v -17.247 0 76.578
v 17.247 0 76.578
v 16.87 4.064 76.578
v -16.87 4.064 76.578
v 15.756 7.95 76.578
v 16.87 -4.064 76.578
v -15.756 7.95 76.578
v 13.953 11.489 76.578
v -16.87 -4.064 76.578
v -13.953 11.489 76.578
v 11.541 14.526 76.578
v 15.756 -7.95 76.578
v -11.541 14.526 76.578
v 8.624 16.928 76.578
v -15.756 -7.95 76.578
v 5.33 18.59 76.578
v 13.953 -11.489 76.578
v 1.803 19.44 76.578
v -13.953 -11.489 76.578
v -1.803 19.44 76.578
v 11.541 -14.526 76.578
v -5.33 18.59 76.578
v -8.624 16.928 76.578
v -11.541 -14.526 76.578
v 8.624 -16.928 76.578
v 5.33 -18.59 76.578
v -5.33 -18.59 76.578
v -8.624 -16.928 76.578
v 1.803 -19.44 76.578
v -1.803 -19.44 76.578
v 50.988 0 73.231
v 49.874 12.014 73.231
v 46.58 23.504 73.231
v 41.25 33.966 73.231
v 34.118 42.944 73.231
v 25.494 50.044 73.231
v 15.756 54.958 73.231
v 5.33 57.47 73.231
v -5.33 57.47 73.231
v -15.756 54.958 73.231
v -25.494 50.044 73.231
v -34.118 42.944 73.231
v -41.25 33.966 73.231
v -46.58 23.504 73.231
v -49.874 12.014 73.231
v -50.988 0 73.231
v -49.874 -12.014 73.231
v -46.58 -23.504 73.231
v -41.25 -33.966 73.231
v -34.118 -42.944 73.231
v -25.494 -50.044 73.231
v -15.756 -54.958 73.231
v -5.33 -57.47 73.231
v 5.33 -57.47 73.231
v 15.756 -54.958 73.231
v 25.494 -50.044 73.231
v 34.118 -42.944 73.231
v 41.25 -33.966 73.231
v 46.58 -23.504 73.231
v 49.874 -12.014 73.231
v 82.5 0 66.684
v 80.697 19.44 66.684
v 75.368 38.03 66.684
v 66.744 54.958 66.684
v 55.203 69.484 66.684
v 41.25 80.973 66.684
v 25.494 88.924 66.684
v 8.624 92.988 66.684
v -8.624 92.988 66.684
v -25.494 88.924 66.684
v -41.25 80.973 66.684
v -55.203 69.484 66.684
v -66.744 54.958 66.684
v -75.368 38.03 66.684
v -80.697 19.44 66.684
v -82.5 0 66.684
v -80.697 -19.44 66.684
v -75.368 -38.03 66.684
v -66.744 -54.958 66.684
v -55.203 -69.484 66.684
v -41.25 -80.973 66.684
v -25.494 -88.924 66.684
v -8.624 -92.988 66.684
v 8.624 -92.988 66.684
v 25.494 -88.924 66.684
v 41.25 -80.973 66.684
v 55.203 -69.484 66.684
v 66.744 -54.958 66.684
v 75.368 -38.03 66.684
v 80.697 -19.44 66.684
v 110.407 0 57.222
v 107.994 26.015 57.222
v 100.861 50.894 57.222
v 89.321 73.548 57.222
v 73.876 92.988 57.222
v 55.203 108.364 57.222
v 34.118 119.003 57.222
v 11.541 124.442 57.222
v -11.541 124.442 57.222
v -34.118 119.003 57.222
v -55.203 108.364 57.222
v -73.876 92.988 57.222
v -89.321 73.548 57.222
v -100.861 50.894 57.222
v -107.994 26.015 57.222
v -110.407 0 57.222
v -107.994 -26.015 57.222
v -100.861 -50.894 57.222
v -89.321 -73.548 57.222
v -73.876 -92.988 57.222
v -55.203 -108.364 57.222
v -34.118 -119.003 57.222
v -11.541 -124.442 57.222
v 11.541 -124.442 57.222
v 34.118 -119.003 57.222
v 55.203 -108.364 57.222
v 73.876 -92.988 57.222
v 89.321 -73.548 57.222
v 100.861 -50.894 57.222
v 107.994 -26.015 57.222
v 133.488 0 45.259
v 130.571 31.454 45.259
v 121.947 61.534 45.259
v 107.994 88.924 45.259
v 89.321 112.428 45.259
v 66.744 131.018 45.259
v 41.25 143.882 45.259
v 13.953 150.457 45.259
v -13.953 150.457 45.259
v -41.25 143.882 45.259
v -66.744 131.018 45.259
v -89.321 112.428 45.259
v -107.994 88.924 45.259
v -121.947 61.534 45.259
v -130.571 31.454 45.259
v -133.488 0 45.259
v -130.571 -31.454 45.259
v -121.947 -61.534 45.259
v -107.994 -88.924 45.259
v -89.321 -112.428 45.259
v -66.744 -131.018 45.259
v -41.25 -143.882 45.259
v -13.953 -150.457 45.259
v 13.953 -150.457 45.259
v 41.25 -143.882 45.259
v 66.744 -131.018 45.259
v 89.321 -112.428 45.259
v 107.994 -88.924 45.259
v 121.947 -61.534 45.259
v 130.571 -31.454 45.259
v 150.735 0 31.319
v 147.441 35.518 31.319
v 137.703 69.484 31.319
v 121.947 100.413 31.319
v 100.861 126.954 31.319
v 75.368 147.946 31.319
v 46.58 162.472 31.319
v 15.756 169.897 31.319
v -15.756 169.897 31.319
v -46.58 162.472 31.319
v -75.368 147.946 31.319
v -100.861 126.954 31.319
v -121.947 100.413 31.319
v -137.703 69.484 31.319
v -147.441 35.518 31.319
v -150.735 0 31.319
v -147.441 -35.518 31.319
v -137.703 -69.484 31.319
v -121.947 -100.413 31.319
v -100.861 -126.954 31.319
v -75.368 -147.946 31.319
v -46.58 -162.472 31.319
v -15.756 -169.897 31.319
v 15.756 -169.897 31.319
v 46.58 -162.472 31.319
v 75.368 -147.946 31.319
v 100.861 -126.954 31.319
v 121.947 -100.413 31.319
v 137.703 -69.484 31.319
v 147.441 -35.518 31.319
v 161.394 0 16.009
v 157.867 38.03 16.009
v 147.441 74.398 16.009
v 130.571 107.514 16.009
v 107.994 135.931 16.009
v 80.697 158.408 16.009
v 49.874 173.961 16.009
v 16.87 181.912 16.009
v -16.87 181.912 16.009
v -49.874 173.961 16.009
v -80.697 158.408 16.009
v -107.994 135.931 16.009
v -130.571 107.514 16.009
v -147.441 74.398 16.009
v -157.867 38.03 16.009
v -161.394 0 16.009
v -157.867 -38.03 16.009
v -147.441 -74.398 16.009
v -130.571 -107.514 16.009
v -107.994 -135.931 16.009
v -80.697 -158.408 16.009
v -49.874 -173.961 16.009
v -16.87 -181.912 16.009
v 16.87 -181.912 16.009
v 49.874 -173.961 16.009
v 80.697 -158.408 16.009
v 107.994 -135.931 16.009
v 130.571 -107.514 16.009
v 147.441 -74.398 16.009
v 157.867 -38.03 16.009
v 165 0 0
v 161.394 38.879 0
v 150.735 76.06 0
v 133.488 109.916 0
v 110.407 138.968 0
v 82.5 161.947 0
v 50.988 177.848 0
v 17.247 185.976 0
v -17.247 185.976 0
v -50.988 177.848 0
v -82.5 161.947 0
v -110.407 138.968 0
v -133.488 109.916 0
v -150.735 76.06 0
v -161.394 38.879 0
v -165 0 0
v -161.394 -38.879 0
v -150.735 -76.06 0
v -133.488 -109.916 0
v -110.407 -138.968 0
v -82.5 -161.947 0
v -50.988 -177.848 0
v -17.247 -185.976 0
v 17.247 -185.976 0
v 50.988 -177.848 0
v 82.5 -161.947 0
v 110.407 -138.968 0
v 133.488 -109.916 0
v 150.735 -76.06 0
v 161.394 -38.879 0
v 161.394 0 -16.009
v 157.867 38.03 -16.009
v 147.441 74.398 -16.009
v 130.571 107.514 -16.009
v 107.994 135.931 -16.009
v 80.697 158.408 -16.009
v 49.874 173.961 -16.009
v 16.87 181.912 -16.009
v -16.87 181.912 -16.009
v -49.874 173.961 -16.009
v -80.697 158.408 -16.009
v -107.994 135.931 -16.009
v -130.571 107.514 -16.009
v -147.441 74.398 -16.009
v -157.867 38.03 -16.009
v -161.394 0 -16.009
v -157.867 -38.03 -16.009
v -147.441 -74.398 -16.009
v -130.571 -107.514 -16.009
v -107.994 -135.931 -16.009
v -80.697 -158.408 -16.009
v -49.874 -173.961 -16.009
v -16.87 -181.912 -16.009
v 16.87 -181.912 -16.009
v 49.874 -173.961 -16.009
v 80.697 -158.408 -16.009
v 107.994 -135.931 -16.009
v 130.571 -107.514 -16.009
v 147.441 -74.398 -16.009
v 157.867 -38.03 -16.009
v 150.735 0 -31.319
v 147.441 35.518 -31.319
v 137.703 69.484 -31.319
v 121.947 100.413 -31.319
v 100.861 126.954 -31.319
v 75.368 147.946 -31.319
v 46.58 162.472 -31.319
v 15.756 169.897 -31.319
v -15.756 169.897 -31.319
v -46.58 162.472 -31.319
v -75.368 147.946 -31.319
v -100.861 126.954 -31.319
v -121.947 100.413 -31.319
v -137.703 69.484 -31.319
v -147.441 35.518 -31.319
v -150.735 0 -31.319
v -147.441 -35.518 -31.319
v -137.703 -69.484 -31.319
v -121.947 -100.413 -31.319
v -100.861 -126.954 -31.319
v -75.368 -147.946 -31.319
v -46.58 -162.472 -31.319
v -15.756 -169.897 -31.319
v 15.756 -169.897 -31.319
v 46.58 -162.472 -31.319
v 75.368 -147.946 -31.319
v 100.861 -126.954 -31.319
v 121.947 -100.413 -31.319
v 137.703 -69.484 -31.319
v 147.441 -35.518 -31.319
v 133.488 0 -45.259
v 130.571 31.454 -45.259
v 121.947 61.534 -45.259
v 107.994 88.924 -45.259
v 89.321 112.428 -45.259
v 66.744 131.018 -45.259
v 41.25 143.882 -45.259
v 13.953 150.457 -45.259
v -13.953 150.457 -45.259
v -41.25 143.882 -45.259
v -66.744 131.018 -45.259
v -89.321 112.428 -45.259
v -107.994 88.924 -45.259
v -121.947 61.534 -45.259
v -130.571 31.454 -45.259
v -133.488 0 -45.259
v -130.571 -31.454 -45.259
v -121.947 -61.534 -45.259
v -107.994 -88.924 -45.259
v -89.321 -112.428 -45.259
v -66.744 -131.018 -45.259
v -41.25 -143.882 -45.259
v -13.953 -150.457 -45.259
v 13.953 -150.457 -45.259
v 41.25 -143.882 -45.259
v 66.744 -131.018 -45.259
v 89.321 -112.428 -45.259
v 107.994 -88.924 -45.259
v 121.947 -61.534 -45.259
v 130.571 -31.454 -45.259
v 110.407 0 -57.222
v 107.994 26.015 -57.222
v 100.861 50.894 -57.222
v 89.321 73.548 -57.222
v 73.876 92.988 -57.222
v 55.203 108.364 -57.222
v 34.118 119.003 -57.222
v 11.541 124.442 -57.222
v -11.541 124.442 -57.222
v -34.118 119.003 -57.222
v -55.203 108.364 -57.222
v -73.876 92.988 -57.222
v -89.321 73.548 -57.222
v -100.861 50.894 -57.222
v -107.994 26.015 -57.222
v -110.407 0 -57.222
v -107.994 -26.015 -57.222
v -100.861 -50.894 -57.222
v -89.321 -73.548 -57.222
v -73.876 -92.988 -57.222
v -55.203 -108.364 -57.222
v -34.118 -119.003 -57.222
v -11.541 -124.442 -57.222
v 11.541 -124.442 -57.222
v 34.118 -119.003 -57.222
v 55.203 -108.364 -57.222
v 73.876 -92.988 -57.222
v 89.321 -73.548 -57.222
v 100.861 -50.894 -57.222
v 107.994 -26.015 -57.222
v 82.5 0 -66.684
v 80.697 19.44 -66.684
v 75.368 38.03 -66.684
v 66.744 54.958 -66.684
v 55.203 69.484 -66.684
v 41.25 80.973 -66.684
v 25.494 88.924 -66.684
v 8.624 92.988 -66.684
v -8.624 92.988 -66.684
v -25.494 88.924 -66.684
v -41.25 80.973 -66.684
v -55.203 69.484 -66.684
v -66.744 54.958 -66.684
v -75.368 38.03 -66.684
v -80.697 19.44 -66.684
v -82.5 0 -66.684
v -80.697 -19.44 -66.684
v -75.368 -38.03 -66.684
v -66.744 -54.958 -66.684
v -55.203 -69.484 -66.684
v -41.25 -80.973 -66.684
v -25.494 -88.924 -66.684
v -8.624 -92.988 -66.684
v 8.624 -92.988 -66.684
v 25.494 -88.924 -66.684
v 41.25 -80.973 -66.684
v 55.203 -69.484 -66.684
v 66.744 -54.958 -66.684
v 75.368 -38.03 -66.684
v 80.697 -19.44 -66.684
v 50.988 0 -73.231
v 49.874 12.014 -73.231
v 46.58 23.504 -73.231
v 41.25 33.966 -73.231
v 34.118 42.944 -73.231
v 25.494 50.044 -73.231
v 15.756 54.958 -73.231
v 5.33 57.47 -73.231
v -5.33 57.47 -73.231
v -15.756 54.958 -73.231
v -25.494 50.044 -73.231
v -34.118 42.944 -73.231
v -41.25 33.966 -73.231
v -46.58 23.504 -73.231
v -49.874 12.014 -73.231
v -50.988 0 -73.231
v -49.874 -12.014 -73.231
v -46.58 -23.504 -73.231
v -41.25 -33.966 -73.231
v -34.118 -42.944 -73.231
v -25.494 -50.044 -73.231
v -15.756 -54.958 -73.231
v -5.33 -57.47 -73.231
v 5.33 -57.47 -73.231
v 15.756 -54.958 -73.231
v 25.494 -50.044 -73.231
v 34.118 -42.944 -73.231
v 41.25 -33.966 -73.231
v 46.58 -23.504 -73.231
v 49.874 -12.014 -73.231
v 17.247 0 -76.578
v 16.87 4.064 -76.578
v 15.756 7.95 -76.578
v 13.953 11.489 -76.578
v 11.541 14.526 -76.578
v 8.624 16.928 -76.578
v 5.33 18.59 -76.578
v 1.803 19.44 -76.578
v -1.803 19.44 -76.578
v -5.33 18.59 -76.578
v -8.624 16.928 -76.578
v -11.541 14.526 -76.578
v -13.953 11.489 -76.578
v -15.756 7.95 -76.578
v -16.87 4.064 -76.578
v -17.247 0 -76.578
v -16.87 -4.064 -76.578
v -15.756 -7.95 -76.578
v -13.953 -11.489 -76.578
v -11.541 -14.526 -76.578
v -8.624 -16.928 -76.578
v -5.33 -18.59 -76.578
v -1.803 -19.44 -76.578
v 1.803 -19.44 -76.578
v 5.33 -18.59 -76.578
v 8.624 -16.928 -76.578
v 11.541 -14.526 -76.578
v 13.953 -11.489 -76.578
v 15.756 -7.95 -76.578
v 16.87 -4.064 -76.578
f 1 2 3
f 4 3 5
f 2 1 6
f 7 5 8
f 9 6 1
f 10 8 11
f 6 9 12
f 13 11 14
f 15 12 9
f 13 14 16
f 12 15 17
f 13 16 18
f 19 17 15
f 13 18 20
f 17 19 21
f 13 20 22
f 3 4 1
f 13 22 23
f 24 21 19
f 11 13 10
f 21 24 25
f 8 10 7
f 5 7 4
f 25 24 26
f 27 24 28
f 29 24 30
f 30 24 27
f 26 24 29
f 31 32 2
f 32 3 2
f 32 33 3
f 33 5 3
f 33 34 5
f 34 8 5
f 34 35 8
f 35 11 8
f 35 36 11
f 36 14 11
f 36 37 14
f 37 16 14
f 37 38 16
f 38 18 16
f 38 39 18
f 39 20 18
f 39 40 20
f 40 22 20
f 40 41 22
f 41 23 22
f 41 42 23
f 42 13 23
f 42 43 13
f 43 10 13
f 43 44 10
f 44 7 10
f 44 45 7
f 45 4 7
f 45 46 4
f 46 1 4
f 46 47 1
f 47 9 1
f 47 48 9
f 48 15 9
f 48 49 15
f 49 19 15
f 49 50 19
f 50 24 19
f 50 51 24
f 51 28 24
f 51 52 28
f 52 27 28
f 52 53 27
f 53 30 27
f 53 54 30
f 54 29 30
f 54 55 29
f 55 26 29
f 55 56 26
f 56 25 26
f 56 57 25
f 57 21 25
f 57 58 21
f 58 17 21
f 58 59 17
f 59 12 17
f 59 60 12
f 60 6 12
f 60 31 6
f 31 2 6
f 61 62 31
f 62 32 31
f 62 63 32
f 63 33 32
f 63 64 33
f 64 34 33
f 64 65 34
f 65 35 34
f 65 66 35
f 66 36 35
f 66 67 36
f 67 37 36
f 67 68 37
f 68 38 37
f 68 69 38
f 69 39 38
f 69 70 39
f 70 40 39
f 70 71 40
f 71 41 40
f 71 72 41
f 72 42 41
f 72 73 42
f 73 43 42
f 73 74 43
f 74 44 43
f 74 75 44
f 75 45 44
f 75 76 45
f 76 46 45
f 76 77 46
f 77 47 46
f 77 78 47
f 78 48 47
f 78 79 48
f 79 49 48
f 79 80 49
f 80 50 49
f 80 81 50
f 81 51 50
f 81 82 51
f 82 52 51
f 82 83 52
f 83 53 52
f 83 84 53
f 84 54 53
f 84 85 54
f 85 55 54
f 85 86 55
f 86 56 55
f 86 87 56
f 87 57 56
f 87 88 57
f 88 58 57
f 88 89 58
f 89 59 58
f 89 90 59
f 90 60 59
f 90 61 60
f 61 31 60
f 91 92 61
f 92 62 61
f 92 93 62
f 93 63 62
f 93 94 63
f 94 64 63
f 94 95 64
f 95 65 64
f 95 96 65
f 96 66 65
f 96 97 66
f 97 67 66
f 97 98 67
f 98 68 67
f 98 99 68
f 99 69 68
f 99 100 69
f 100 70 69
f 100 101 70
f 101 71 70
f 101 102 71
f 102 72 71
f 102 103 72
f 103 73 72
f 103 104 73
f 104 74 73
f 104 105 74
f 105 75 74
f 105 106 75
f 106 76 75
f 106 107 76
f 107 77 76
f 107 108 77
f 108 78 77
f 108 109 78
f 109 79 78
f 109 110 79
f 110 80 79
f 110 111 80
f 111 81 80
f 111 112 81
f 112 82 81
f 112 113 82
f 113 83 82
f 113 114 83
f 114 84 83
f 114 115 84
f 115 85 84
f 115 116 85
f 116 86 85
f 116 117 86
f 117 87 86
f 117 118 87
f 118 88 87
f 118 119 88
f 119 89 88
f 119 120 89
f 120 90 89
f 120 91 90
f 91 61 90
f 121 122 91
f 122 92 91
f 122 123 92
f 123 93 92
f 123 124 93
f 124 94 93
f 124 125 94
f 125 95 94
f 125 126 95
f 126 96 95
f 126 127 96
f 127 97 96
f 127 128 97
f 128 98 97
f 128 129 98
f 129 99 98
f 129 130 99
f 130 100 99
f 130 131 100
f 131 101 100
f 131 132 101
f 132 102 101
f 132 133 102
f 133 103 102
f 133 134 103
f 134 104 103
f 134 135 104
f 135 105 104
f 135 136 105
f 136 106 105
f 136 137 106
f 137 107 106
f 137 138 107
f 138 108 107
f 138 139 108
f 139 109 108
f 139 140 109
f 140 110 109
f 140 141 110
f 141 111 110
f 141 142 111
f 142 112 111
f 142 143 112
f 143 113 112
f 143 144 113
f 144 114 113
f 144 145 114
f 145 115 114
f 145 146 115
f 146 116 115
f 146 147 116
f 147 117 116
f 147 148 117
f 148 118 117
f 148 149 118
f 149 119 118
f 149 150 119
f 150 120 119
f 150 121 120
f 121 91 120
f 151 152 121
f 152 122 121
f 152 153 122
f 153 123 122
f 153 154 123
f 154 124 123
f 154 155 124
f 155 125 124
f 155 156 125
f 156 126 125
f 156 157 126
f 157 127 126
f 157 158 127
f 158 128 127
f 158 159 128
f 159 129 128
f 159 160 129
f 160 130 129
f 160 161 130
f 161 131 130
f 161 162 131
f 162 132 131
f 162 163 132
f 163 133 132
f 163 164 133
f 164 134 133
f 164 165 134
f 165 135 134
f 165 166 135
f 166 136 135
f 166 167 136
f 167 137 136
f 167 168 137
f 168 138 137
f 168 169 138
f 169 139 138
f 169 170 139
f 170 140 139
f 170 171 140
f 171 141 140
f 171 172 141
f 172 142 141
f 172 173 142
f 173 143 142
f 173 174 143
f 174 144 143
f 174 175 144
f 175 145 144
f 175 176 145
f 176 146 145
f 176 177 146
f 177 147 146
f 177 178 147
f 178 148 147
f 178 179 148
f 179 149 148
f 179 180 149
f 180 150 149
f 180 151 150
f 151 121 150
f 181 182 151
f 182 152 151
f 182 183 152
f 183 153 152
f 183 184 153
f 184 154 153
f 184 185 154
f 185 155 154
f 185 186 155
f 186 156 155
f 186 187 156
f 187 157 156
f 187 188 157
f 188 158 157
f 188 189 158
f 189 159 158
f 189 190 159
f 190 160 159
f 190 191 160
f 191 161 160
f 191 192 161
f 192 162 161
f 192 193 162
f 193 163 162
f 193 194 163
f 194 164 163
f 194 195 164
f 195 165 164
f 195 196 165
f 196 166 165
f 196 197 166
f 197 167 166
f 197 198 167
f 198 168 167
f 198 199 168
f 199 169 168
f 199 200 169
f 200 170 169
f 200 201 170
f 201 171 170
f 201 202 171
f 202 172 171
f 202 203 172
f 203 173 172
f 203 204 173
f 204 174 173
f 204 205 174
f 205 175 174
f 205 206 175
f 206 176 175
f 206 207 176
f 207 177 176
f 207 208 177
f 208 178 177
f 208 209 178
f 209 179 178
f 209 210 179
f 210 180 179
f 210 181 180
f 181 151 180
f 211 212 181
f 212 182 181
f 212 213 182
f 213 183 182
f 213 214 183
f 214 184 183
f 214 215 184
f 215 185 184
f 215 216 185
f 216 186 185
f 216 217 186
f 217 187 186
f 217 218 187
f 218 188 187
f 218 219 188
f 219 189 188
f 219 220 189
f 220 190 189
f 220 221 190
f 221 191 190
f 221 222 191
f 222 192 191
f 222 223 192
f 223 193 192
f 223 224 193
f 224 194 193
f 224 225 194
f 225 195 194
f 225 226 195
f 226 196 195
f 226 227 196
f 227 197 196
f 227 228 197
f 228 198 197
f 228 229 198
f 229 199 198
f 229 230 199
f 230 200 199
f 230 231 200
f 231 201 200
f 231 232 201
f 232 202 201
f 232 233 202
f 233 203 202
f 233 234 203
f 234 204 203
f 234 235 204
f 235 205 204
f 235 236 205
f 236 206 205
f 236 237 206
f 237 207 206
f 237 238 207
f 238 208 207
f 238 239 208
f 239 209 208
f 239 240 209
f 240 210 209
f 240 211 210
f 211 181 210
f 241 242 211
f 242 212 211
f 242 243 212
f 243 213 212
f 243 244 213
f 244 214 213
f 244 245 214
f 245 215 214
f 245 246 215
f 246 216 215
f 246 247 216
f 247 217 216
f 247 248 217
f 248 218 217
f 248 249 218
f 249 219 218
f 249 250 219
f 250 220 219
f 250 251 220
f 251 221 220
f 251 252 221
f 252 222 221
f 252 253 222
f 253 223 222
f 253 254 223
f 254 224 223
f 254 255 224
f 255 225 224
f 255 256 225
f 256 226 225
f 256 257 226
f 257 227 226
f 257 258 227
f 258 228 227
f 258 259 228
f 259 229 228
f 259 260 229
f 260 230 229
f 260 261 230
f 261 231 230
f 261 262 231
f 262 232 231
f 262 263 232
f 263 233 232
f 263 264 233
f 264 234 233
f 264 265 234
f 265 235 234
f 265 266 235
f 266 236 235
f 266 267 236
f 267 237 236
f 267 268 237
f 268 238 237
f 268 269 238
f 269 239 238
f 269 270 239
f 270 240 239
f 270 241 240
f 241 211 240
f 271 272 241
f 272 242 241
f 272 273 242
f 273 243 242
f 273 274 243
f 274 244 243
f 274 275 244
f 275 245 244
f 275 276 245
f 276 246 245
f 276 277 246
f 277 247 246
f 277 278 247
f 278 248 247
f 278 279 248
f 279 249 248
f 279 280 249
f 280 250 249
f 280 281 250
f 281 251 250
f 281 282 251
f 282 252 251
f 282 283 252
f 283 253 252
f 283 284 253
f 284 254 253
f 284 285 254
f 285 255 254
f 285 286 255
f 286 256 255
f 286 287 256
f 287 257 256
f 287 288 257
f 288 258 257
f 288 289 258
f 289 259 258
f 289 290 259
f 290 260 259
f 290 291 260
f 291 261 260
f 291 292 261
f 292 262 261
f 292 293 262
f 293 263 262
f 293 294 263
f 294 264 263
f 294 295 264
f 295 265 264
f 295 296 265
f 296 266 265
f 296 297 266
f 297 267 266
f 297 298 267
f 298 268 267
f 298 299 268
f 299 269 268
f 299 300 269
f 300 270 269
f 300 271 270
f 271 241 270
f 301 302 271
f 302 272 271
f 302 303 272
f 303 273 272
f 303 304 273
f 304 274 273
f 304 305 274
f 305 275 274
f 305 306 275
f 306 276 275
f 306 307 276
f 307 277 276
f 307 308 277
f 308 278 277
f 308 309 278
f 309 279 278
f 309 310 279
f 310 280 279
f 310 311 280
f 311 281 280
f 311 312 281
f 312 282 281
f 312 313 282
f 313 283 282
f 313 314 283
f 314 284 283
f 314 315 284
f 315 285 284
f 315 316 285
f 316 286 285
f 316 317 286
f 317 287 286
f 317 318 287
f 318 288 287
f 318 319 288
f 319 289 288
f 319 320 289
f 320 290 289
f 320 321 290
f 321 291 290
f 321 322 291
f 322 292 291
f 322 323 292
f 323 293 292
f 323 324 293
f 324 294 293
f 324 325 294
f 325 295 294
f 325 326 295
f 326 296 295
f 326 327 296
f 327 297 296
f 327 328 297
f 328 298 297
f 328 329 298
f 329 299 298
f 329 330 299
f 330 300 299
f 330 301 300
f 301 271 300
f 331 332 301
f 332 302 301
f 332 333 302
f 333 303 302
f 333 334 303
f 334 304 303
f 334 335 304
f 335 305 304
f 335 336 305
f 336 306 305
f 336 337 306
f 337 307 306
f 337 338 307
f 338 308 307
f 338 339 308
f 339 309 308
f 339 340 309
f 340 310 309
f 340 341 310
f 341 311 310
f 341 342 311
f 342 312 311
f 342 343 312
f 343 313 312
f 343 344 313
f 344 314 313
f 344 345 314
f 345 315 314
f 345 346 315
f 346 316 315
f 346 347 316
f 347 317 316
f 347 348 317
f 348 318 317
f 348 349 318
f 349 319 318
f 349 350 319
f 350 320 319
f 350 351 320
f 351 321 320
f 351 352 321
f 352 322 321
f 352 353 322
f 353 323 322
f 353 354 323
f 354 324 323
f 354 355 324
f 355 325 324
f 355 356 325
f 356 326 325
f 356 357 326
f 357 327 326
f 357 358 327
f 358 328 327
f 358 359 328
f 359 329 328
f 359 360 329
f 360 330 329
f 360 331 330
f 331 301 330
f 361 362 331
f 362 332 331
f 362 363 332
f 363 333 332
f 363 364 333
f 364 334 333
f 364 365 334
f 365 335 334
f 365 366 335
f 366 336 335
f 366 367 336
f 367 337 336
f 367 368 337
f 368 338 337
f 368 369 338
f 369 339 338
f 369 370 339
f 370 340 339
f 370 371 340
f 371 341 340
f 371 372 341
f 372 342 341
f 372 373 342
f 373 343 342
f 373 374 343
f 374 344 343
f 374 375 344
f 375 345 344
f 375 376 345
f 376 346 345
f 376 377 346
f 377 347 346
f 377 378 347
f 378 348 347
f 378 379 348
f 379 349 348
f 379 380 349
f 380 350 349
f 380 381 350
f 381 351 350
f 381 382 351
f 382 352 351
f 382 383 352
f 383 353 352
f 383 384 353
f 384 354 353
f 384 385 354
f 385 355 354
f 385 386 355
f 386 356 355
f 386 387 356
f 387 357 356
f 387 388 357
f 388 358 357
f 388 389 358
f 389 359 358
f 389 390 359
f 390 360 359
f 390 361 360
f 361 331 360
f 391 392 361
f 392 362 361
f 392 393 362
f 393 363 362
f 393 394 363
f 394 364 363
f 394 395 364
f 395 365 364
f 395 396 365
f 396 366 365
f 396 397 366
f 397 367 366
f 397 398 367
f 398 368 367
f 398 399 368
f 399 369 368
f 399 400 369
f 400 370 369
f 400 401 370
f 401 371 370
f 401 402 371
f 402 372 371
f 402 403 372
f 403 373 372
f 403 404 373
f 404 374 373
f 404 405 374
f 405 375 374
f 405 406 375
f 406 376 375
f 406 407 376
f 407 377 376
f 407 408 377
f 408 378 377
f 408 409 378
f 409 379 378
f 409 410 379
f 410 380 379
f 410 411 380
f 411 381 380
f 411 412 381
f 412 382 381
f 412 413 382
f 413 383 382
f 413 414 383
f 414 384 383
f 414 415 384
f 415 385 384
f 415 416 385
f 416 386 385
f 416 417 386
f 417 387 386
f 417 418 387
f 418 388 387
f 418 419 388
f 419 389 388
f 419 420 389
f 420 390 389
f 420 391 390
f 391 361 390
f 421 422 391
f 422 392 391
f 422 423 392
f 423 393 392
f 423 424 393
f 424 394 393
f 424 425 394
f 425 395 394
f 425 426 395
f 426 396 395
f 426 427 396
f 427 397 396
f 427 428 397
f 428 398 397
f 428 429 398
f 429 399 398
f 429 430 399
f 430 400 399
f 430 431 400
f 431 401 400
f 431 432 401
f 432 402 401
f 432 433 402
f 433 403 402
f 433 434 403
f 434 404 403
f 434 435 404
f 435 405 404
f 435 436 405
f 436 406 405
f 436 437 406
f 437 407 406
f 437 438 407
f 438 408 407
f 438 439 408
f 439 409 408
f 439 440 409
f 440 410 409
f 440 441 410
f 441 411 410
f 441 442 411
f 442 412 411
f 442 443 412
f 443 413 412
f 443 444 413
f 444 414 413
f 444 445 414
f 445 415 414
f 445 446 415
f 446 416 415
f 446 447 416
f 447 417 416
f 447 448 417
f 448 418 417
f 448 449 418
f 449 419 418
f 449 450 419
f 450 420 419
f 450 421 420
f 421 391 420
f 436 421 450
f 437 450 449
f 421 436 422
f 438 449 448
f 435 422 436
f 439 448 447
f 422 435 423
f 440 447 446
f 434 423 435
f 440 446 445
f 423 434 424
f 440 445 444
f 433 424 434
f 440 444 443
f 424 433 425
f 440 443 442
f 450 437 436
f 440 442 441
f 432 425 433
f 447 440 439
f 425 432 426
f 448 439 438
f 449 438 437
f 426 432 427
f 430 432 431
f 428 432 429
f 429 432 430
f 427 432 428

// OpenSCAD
// Generated by SolidPython 1.0.1 on 2020-07-29 00:46:52


scale(v = [15, 17, 7]) {
	sphere(r = 11);
}
/***********************************************
*********      SolidPython code:      **********
************************************************
 
# import packages: SolidPython
from solid import *
from solid.utils import *
from itertools import chain, combinations, permutations


class Resize:

    def __init__(self, scad_file):
        self.scad_file = scad_file
        #self.scad_file = import_scad(scad_file)
        # cone/cylinder param:
        self.r1 = 0
        self.r2 = 0
        self.h = 0
        # rectangular prism param:
        self.w = 0
        self.l = 0
        # ellipse param:
        self.r = 0

    # import OpenScad code (file name corresponds to shape)


    # classify shape + parameters
    def assign(self, param1, param2, param3):
        if self.scad_file == 'cone.scad':
            self.r1 = param1
            self.r2 = param2
            self.h = param3
        elif self.scad_file == 'cylinder.scad':
            self.r1 = param1
            self.r2 = param2
            self.h = param3
        elif self.scad_file == 'rectangularPrism.scad':
            self.h = param1
            self.l = param2
            self.w = param3
        else:
            self.r = param1
            self.h = param2

    # resize parameters
    def iterate(self):
        x = range(3, 20, 2)
        i = 1
        if self.scad_file == 'cone.scad':
            tempList = list(permutations(x, 2))
            for temp in tempList:
                param1 = temp[0]
                param2 = temp[1]
                filepath = 'produced_scad_files/' + 'cone' + str(param1) + '_' + str(param2) + '_' + '.scad'
                scad_render_to_file(cylinder(h=param1, r1=param2, r2=0), filepath)

        elif self.scad_file == 'cylinder.scad':
            tempList = list(permutations(x, 3))
            for temp in tempList:
                param1 = temp[0]
                param2 = temp[1]
                filepath = 'produced_scad_files/' + 'cylinder' + str(param1) + '_' + str(param2) + '_' + '.scad'
                scad_render_to_file(cylinder(h=param1, r1=param2, r2=param2), filepath)

        elif self.scad_file == 'rectangularPrism.scad':
            tempList = list(permutations(x, 3))
            for temp in tempList:
                param1 = temp[0]
                param2 = temp[1]
                param3 = temp[2]
                filepath = 'produced_scad_files/' + 'rectangularPrism' + str(param1) + '_' + str(param2) + '_' + str(
                    param3) + '.scad'
                scad_render_to_file(cube(size=(param1, param2, param3)), filepath)

        elif self.scad_file == 'ellipse.scad':
            tempList = list(permutations(x, 4))
            for temp in tempList:
                param1 = temp[0]
                param2 = temp[1]
                param3 = temp[2]
                param4 = temp[3]
                filepath = 'produced_scad_files/' + 'ellipse' + str(param1) + '_' + str(param2) + '_' + str(param3) + '_' + str(param4) + '.scad'
                scad_render_to_file(scale([param1, param2, param3])(sphere(r=param4)), filepath)

    def render_to_scadfile(self):
        scad_render_to_file(scad, 'example.scad') 
 
************************************************/
